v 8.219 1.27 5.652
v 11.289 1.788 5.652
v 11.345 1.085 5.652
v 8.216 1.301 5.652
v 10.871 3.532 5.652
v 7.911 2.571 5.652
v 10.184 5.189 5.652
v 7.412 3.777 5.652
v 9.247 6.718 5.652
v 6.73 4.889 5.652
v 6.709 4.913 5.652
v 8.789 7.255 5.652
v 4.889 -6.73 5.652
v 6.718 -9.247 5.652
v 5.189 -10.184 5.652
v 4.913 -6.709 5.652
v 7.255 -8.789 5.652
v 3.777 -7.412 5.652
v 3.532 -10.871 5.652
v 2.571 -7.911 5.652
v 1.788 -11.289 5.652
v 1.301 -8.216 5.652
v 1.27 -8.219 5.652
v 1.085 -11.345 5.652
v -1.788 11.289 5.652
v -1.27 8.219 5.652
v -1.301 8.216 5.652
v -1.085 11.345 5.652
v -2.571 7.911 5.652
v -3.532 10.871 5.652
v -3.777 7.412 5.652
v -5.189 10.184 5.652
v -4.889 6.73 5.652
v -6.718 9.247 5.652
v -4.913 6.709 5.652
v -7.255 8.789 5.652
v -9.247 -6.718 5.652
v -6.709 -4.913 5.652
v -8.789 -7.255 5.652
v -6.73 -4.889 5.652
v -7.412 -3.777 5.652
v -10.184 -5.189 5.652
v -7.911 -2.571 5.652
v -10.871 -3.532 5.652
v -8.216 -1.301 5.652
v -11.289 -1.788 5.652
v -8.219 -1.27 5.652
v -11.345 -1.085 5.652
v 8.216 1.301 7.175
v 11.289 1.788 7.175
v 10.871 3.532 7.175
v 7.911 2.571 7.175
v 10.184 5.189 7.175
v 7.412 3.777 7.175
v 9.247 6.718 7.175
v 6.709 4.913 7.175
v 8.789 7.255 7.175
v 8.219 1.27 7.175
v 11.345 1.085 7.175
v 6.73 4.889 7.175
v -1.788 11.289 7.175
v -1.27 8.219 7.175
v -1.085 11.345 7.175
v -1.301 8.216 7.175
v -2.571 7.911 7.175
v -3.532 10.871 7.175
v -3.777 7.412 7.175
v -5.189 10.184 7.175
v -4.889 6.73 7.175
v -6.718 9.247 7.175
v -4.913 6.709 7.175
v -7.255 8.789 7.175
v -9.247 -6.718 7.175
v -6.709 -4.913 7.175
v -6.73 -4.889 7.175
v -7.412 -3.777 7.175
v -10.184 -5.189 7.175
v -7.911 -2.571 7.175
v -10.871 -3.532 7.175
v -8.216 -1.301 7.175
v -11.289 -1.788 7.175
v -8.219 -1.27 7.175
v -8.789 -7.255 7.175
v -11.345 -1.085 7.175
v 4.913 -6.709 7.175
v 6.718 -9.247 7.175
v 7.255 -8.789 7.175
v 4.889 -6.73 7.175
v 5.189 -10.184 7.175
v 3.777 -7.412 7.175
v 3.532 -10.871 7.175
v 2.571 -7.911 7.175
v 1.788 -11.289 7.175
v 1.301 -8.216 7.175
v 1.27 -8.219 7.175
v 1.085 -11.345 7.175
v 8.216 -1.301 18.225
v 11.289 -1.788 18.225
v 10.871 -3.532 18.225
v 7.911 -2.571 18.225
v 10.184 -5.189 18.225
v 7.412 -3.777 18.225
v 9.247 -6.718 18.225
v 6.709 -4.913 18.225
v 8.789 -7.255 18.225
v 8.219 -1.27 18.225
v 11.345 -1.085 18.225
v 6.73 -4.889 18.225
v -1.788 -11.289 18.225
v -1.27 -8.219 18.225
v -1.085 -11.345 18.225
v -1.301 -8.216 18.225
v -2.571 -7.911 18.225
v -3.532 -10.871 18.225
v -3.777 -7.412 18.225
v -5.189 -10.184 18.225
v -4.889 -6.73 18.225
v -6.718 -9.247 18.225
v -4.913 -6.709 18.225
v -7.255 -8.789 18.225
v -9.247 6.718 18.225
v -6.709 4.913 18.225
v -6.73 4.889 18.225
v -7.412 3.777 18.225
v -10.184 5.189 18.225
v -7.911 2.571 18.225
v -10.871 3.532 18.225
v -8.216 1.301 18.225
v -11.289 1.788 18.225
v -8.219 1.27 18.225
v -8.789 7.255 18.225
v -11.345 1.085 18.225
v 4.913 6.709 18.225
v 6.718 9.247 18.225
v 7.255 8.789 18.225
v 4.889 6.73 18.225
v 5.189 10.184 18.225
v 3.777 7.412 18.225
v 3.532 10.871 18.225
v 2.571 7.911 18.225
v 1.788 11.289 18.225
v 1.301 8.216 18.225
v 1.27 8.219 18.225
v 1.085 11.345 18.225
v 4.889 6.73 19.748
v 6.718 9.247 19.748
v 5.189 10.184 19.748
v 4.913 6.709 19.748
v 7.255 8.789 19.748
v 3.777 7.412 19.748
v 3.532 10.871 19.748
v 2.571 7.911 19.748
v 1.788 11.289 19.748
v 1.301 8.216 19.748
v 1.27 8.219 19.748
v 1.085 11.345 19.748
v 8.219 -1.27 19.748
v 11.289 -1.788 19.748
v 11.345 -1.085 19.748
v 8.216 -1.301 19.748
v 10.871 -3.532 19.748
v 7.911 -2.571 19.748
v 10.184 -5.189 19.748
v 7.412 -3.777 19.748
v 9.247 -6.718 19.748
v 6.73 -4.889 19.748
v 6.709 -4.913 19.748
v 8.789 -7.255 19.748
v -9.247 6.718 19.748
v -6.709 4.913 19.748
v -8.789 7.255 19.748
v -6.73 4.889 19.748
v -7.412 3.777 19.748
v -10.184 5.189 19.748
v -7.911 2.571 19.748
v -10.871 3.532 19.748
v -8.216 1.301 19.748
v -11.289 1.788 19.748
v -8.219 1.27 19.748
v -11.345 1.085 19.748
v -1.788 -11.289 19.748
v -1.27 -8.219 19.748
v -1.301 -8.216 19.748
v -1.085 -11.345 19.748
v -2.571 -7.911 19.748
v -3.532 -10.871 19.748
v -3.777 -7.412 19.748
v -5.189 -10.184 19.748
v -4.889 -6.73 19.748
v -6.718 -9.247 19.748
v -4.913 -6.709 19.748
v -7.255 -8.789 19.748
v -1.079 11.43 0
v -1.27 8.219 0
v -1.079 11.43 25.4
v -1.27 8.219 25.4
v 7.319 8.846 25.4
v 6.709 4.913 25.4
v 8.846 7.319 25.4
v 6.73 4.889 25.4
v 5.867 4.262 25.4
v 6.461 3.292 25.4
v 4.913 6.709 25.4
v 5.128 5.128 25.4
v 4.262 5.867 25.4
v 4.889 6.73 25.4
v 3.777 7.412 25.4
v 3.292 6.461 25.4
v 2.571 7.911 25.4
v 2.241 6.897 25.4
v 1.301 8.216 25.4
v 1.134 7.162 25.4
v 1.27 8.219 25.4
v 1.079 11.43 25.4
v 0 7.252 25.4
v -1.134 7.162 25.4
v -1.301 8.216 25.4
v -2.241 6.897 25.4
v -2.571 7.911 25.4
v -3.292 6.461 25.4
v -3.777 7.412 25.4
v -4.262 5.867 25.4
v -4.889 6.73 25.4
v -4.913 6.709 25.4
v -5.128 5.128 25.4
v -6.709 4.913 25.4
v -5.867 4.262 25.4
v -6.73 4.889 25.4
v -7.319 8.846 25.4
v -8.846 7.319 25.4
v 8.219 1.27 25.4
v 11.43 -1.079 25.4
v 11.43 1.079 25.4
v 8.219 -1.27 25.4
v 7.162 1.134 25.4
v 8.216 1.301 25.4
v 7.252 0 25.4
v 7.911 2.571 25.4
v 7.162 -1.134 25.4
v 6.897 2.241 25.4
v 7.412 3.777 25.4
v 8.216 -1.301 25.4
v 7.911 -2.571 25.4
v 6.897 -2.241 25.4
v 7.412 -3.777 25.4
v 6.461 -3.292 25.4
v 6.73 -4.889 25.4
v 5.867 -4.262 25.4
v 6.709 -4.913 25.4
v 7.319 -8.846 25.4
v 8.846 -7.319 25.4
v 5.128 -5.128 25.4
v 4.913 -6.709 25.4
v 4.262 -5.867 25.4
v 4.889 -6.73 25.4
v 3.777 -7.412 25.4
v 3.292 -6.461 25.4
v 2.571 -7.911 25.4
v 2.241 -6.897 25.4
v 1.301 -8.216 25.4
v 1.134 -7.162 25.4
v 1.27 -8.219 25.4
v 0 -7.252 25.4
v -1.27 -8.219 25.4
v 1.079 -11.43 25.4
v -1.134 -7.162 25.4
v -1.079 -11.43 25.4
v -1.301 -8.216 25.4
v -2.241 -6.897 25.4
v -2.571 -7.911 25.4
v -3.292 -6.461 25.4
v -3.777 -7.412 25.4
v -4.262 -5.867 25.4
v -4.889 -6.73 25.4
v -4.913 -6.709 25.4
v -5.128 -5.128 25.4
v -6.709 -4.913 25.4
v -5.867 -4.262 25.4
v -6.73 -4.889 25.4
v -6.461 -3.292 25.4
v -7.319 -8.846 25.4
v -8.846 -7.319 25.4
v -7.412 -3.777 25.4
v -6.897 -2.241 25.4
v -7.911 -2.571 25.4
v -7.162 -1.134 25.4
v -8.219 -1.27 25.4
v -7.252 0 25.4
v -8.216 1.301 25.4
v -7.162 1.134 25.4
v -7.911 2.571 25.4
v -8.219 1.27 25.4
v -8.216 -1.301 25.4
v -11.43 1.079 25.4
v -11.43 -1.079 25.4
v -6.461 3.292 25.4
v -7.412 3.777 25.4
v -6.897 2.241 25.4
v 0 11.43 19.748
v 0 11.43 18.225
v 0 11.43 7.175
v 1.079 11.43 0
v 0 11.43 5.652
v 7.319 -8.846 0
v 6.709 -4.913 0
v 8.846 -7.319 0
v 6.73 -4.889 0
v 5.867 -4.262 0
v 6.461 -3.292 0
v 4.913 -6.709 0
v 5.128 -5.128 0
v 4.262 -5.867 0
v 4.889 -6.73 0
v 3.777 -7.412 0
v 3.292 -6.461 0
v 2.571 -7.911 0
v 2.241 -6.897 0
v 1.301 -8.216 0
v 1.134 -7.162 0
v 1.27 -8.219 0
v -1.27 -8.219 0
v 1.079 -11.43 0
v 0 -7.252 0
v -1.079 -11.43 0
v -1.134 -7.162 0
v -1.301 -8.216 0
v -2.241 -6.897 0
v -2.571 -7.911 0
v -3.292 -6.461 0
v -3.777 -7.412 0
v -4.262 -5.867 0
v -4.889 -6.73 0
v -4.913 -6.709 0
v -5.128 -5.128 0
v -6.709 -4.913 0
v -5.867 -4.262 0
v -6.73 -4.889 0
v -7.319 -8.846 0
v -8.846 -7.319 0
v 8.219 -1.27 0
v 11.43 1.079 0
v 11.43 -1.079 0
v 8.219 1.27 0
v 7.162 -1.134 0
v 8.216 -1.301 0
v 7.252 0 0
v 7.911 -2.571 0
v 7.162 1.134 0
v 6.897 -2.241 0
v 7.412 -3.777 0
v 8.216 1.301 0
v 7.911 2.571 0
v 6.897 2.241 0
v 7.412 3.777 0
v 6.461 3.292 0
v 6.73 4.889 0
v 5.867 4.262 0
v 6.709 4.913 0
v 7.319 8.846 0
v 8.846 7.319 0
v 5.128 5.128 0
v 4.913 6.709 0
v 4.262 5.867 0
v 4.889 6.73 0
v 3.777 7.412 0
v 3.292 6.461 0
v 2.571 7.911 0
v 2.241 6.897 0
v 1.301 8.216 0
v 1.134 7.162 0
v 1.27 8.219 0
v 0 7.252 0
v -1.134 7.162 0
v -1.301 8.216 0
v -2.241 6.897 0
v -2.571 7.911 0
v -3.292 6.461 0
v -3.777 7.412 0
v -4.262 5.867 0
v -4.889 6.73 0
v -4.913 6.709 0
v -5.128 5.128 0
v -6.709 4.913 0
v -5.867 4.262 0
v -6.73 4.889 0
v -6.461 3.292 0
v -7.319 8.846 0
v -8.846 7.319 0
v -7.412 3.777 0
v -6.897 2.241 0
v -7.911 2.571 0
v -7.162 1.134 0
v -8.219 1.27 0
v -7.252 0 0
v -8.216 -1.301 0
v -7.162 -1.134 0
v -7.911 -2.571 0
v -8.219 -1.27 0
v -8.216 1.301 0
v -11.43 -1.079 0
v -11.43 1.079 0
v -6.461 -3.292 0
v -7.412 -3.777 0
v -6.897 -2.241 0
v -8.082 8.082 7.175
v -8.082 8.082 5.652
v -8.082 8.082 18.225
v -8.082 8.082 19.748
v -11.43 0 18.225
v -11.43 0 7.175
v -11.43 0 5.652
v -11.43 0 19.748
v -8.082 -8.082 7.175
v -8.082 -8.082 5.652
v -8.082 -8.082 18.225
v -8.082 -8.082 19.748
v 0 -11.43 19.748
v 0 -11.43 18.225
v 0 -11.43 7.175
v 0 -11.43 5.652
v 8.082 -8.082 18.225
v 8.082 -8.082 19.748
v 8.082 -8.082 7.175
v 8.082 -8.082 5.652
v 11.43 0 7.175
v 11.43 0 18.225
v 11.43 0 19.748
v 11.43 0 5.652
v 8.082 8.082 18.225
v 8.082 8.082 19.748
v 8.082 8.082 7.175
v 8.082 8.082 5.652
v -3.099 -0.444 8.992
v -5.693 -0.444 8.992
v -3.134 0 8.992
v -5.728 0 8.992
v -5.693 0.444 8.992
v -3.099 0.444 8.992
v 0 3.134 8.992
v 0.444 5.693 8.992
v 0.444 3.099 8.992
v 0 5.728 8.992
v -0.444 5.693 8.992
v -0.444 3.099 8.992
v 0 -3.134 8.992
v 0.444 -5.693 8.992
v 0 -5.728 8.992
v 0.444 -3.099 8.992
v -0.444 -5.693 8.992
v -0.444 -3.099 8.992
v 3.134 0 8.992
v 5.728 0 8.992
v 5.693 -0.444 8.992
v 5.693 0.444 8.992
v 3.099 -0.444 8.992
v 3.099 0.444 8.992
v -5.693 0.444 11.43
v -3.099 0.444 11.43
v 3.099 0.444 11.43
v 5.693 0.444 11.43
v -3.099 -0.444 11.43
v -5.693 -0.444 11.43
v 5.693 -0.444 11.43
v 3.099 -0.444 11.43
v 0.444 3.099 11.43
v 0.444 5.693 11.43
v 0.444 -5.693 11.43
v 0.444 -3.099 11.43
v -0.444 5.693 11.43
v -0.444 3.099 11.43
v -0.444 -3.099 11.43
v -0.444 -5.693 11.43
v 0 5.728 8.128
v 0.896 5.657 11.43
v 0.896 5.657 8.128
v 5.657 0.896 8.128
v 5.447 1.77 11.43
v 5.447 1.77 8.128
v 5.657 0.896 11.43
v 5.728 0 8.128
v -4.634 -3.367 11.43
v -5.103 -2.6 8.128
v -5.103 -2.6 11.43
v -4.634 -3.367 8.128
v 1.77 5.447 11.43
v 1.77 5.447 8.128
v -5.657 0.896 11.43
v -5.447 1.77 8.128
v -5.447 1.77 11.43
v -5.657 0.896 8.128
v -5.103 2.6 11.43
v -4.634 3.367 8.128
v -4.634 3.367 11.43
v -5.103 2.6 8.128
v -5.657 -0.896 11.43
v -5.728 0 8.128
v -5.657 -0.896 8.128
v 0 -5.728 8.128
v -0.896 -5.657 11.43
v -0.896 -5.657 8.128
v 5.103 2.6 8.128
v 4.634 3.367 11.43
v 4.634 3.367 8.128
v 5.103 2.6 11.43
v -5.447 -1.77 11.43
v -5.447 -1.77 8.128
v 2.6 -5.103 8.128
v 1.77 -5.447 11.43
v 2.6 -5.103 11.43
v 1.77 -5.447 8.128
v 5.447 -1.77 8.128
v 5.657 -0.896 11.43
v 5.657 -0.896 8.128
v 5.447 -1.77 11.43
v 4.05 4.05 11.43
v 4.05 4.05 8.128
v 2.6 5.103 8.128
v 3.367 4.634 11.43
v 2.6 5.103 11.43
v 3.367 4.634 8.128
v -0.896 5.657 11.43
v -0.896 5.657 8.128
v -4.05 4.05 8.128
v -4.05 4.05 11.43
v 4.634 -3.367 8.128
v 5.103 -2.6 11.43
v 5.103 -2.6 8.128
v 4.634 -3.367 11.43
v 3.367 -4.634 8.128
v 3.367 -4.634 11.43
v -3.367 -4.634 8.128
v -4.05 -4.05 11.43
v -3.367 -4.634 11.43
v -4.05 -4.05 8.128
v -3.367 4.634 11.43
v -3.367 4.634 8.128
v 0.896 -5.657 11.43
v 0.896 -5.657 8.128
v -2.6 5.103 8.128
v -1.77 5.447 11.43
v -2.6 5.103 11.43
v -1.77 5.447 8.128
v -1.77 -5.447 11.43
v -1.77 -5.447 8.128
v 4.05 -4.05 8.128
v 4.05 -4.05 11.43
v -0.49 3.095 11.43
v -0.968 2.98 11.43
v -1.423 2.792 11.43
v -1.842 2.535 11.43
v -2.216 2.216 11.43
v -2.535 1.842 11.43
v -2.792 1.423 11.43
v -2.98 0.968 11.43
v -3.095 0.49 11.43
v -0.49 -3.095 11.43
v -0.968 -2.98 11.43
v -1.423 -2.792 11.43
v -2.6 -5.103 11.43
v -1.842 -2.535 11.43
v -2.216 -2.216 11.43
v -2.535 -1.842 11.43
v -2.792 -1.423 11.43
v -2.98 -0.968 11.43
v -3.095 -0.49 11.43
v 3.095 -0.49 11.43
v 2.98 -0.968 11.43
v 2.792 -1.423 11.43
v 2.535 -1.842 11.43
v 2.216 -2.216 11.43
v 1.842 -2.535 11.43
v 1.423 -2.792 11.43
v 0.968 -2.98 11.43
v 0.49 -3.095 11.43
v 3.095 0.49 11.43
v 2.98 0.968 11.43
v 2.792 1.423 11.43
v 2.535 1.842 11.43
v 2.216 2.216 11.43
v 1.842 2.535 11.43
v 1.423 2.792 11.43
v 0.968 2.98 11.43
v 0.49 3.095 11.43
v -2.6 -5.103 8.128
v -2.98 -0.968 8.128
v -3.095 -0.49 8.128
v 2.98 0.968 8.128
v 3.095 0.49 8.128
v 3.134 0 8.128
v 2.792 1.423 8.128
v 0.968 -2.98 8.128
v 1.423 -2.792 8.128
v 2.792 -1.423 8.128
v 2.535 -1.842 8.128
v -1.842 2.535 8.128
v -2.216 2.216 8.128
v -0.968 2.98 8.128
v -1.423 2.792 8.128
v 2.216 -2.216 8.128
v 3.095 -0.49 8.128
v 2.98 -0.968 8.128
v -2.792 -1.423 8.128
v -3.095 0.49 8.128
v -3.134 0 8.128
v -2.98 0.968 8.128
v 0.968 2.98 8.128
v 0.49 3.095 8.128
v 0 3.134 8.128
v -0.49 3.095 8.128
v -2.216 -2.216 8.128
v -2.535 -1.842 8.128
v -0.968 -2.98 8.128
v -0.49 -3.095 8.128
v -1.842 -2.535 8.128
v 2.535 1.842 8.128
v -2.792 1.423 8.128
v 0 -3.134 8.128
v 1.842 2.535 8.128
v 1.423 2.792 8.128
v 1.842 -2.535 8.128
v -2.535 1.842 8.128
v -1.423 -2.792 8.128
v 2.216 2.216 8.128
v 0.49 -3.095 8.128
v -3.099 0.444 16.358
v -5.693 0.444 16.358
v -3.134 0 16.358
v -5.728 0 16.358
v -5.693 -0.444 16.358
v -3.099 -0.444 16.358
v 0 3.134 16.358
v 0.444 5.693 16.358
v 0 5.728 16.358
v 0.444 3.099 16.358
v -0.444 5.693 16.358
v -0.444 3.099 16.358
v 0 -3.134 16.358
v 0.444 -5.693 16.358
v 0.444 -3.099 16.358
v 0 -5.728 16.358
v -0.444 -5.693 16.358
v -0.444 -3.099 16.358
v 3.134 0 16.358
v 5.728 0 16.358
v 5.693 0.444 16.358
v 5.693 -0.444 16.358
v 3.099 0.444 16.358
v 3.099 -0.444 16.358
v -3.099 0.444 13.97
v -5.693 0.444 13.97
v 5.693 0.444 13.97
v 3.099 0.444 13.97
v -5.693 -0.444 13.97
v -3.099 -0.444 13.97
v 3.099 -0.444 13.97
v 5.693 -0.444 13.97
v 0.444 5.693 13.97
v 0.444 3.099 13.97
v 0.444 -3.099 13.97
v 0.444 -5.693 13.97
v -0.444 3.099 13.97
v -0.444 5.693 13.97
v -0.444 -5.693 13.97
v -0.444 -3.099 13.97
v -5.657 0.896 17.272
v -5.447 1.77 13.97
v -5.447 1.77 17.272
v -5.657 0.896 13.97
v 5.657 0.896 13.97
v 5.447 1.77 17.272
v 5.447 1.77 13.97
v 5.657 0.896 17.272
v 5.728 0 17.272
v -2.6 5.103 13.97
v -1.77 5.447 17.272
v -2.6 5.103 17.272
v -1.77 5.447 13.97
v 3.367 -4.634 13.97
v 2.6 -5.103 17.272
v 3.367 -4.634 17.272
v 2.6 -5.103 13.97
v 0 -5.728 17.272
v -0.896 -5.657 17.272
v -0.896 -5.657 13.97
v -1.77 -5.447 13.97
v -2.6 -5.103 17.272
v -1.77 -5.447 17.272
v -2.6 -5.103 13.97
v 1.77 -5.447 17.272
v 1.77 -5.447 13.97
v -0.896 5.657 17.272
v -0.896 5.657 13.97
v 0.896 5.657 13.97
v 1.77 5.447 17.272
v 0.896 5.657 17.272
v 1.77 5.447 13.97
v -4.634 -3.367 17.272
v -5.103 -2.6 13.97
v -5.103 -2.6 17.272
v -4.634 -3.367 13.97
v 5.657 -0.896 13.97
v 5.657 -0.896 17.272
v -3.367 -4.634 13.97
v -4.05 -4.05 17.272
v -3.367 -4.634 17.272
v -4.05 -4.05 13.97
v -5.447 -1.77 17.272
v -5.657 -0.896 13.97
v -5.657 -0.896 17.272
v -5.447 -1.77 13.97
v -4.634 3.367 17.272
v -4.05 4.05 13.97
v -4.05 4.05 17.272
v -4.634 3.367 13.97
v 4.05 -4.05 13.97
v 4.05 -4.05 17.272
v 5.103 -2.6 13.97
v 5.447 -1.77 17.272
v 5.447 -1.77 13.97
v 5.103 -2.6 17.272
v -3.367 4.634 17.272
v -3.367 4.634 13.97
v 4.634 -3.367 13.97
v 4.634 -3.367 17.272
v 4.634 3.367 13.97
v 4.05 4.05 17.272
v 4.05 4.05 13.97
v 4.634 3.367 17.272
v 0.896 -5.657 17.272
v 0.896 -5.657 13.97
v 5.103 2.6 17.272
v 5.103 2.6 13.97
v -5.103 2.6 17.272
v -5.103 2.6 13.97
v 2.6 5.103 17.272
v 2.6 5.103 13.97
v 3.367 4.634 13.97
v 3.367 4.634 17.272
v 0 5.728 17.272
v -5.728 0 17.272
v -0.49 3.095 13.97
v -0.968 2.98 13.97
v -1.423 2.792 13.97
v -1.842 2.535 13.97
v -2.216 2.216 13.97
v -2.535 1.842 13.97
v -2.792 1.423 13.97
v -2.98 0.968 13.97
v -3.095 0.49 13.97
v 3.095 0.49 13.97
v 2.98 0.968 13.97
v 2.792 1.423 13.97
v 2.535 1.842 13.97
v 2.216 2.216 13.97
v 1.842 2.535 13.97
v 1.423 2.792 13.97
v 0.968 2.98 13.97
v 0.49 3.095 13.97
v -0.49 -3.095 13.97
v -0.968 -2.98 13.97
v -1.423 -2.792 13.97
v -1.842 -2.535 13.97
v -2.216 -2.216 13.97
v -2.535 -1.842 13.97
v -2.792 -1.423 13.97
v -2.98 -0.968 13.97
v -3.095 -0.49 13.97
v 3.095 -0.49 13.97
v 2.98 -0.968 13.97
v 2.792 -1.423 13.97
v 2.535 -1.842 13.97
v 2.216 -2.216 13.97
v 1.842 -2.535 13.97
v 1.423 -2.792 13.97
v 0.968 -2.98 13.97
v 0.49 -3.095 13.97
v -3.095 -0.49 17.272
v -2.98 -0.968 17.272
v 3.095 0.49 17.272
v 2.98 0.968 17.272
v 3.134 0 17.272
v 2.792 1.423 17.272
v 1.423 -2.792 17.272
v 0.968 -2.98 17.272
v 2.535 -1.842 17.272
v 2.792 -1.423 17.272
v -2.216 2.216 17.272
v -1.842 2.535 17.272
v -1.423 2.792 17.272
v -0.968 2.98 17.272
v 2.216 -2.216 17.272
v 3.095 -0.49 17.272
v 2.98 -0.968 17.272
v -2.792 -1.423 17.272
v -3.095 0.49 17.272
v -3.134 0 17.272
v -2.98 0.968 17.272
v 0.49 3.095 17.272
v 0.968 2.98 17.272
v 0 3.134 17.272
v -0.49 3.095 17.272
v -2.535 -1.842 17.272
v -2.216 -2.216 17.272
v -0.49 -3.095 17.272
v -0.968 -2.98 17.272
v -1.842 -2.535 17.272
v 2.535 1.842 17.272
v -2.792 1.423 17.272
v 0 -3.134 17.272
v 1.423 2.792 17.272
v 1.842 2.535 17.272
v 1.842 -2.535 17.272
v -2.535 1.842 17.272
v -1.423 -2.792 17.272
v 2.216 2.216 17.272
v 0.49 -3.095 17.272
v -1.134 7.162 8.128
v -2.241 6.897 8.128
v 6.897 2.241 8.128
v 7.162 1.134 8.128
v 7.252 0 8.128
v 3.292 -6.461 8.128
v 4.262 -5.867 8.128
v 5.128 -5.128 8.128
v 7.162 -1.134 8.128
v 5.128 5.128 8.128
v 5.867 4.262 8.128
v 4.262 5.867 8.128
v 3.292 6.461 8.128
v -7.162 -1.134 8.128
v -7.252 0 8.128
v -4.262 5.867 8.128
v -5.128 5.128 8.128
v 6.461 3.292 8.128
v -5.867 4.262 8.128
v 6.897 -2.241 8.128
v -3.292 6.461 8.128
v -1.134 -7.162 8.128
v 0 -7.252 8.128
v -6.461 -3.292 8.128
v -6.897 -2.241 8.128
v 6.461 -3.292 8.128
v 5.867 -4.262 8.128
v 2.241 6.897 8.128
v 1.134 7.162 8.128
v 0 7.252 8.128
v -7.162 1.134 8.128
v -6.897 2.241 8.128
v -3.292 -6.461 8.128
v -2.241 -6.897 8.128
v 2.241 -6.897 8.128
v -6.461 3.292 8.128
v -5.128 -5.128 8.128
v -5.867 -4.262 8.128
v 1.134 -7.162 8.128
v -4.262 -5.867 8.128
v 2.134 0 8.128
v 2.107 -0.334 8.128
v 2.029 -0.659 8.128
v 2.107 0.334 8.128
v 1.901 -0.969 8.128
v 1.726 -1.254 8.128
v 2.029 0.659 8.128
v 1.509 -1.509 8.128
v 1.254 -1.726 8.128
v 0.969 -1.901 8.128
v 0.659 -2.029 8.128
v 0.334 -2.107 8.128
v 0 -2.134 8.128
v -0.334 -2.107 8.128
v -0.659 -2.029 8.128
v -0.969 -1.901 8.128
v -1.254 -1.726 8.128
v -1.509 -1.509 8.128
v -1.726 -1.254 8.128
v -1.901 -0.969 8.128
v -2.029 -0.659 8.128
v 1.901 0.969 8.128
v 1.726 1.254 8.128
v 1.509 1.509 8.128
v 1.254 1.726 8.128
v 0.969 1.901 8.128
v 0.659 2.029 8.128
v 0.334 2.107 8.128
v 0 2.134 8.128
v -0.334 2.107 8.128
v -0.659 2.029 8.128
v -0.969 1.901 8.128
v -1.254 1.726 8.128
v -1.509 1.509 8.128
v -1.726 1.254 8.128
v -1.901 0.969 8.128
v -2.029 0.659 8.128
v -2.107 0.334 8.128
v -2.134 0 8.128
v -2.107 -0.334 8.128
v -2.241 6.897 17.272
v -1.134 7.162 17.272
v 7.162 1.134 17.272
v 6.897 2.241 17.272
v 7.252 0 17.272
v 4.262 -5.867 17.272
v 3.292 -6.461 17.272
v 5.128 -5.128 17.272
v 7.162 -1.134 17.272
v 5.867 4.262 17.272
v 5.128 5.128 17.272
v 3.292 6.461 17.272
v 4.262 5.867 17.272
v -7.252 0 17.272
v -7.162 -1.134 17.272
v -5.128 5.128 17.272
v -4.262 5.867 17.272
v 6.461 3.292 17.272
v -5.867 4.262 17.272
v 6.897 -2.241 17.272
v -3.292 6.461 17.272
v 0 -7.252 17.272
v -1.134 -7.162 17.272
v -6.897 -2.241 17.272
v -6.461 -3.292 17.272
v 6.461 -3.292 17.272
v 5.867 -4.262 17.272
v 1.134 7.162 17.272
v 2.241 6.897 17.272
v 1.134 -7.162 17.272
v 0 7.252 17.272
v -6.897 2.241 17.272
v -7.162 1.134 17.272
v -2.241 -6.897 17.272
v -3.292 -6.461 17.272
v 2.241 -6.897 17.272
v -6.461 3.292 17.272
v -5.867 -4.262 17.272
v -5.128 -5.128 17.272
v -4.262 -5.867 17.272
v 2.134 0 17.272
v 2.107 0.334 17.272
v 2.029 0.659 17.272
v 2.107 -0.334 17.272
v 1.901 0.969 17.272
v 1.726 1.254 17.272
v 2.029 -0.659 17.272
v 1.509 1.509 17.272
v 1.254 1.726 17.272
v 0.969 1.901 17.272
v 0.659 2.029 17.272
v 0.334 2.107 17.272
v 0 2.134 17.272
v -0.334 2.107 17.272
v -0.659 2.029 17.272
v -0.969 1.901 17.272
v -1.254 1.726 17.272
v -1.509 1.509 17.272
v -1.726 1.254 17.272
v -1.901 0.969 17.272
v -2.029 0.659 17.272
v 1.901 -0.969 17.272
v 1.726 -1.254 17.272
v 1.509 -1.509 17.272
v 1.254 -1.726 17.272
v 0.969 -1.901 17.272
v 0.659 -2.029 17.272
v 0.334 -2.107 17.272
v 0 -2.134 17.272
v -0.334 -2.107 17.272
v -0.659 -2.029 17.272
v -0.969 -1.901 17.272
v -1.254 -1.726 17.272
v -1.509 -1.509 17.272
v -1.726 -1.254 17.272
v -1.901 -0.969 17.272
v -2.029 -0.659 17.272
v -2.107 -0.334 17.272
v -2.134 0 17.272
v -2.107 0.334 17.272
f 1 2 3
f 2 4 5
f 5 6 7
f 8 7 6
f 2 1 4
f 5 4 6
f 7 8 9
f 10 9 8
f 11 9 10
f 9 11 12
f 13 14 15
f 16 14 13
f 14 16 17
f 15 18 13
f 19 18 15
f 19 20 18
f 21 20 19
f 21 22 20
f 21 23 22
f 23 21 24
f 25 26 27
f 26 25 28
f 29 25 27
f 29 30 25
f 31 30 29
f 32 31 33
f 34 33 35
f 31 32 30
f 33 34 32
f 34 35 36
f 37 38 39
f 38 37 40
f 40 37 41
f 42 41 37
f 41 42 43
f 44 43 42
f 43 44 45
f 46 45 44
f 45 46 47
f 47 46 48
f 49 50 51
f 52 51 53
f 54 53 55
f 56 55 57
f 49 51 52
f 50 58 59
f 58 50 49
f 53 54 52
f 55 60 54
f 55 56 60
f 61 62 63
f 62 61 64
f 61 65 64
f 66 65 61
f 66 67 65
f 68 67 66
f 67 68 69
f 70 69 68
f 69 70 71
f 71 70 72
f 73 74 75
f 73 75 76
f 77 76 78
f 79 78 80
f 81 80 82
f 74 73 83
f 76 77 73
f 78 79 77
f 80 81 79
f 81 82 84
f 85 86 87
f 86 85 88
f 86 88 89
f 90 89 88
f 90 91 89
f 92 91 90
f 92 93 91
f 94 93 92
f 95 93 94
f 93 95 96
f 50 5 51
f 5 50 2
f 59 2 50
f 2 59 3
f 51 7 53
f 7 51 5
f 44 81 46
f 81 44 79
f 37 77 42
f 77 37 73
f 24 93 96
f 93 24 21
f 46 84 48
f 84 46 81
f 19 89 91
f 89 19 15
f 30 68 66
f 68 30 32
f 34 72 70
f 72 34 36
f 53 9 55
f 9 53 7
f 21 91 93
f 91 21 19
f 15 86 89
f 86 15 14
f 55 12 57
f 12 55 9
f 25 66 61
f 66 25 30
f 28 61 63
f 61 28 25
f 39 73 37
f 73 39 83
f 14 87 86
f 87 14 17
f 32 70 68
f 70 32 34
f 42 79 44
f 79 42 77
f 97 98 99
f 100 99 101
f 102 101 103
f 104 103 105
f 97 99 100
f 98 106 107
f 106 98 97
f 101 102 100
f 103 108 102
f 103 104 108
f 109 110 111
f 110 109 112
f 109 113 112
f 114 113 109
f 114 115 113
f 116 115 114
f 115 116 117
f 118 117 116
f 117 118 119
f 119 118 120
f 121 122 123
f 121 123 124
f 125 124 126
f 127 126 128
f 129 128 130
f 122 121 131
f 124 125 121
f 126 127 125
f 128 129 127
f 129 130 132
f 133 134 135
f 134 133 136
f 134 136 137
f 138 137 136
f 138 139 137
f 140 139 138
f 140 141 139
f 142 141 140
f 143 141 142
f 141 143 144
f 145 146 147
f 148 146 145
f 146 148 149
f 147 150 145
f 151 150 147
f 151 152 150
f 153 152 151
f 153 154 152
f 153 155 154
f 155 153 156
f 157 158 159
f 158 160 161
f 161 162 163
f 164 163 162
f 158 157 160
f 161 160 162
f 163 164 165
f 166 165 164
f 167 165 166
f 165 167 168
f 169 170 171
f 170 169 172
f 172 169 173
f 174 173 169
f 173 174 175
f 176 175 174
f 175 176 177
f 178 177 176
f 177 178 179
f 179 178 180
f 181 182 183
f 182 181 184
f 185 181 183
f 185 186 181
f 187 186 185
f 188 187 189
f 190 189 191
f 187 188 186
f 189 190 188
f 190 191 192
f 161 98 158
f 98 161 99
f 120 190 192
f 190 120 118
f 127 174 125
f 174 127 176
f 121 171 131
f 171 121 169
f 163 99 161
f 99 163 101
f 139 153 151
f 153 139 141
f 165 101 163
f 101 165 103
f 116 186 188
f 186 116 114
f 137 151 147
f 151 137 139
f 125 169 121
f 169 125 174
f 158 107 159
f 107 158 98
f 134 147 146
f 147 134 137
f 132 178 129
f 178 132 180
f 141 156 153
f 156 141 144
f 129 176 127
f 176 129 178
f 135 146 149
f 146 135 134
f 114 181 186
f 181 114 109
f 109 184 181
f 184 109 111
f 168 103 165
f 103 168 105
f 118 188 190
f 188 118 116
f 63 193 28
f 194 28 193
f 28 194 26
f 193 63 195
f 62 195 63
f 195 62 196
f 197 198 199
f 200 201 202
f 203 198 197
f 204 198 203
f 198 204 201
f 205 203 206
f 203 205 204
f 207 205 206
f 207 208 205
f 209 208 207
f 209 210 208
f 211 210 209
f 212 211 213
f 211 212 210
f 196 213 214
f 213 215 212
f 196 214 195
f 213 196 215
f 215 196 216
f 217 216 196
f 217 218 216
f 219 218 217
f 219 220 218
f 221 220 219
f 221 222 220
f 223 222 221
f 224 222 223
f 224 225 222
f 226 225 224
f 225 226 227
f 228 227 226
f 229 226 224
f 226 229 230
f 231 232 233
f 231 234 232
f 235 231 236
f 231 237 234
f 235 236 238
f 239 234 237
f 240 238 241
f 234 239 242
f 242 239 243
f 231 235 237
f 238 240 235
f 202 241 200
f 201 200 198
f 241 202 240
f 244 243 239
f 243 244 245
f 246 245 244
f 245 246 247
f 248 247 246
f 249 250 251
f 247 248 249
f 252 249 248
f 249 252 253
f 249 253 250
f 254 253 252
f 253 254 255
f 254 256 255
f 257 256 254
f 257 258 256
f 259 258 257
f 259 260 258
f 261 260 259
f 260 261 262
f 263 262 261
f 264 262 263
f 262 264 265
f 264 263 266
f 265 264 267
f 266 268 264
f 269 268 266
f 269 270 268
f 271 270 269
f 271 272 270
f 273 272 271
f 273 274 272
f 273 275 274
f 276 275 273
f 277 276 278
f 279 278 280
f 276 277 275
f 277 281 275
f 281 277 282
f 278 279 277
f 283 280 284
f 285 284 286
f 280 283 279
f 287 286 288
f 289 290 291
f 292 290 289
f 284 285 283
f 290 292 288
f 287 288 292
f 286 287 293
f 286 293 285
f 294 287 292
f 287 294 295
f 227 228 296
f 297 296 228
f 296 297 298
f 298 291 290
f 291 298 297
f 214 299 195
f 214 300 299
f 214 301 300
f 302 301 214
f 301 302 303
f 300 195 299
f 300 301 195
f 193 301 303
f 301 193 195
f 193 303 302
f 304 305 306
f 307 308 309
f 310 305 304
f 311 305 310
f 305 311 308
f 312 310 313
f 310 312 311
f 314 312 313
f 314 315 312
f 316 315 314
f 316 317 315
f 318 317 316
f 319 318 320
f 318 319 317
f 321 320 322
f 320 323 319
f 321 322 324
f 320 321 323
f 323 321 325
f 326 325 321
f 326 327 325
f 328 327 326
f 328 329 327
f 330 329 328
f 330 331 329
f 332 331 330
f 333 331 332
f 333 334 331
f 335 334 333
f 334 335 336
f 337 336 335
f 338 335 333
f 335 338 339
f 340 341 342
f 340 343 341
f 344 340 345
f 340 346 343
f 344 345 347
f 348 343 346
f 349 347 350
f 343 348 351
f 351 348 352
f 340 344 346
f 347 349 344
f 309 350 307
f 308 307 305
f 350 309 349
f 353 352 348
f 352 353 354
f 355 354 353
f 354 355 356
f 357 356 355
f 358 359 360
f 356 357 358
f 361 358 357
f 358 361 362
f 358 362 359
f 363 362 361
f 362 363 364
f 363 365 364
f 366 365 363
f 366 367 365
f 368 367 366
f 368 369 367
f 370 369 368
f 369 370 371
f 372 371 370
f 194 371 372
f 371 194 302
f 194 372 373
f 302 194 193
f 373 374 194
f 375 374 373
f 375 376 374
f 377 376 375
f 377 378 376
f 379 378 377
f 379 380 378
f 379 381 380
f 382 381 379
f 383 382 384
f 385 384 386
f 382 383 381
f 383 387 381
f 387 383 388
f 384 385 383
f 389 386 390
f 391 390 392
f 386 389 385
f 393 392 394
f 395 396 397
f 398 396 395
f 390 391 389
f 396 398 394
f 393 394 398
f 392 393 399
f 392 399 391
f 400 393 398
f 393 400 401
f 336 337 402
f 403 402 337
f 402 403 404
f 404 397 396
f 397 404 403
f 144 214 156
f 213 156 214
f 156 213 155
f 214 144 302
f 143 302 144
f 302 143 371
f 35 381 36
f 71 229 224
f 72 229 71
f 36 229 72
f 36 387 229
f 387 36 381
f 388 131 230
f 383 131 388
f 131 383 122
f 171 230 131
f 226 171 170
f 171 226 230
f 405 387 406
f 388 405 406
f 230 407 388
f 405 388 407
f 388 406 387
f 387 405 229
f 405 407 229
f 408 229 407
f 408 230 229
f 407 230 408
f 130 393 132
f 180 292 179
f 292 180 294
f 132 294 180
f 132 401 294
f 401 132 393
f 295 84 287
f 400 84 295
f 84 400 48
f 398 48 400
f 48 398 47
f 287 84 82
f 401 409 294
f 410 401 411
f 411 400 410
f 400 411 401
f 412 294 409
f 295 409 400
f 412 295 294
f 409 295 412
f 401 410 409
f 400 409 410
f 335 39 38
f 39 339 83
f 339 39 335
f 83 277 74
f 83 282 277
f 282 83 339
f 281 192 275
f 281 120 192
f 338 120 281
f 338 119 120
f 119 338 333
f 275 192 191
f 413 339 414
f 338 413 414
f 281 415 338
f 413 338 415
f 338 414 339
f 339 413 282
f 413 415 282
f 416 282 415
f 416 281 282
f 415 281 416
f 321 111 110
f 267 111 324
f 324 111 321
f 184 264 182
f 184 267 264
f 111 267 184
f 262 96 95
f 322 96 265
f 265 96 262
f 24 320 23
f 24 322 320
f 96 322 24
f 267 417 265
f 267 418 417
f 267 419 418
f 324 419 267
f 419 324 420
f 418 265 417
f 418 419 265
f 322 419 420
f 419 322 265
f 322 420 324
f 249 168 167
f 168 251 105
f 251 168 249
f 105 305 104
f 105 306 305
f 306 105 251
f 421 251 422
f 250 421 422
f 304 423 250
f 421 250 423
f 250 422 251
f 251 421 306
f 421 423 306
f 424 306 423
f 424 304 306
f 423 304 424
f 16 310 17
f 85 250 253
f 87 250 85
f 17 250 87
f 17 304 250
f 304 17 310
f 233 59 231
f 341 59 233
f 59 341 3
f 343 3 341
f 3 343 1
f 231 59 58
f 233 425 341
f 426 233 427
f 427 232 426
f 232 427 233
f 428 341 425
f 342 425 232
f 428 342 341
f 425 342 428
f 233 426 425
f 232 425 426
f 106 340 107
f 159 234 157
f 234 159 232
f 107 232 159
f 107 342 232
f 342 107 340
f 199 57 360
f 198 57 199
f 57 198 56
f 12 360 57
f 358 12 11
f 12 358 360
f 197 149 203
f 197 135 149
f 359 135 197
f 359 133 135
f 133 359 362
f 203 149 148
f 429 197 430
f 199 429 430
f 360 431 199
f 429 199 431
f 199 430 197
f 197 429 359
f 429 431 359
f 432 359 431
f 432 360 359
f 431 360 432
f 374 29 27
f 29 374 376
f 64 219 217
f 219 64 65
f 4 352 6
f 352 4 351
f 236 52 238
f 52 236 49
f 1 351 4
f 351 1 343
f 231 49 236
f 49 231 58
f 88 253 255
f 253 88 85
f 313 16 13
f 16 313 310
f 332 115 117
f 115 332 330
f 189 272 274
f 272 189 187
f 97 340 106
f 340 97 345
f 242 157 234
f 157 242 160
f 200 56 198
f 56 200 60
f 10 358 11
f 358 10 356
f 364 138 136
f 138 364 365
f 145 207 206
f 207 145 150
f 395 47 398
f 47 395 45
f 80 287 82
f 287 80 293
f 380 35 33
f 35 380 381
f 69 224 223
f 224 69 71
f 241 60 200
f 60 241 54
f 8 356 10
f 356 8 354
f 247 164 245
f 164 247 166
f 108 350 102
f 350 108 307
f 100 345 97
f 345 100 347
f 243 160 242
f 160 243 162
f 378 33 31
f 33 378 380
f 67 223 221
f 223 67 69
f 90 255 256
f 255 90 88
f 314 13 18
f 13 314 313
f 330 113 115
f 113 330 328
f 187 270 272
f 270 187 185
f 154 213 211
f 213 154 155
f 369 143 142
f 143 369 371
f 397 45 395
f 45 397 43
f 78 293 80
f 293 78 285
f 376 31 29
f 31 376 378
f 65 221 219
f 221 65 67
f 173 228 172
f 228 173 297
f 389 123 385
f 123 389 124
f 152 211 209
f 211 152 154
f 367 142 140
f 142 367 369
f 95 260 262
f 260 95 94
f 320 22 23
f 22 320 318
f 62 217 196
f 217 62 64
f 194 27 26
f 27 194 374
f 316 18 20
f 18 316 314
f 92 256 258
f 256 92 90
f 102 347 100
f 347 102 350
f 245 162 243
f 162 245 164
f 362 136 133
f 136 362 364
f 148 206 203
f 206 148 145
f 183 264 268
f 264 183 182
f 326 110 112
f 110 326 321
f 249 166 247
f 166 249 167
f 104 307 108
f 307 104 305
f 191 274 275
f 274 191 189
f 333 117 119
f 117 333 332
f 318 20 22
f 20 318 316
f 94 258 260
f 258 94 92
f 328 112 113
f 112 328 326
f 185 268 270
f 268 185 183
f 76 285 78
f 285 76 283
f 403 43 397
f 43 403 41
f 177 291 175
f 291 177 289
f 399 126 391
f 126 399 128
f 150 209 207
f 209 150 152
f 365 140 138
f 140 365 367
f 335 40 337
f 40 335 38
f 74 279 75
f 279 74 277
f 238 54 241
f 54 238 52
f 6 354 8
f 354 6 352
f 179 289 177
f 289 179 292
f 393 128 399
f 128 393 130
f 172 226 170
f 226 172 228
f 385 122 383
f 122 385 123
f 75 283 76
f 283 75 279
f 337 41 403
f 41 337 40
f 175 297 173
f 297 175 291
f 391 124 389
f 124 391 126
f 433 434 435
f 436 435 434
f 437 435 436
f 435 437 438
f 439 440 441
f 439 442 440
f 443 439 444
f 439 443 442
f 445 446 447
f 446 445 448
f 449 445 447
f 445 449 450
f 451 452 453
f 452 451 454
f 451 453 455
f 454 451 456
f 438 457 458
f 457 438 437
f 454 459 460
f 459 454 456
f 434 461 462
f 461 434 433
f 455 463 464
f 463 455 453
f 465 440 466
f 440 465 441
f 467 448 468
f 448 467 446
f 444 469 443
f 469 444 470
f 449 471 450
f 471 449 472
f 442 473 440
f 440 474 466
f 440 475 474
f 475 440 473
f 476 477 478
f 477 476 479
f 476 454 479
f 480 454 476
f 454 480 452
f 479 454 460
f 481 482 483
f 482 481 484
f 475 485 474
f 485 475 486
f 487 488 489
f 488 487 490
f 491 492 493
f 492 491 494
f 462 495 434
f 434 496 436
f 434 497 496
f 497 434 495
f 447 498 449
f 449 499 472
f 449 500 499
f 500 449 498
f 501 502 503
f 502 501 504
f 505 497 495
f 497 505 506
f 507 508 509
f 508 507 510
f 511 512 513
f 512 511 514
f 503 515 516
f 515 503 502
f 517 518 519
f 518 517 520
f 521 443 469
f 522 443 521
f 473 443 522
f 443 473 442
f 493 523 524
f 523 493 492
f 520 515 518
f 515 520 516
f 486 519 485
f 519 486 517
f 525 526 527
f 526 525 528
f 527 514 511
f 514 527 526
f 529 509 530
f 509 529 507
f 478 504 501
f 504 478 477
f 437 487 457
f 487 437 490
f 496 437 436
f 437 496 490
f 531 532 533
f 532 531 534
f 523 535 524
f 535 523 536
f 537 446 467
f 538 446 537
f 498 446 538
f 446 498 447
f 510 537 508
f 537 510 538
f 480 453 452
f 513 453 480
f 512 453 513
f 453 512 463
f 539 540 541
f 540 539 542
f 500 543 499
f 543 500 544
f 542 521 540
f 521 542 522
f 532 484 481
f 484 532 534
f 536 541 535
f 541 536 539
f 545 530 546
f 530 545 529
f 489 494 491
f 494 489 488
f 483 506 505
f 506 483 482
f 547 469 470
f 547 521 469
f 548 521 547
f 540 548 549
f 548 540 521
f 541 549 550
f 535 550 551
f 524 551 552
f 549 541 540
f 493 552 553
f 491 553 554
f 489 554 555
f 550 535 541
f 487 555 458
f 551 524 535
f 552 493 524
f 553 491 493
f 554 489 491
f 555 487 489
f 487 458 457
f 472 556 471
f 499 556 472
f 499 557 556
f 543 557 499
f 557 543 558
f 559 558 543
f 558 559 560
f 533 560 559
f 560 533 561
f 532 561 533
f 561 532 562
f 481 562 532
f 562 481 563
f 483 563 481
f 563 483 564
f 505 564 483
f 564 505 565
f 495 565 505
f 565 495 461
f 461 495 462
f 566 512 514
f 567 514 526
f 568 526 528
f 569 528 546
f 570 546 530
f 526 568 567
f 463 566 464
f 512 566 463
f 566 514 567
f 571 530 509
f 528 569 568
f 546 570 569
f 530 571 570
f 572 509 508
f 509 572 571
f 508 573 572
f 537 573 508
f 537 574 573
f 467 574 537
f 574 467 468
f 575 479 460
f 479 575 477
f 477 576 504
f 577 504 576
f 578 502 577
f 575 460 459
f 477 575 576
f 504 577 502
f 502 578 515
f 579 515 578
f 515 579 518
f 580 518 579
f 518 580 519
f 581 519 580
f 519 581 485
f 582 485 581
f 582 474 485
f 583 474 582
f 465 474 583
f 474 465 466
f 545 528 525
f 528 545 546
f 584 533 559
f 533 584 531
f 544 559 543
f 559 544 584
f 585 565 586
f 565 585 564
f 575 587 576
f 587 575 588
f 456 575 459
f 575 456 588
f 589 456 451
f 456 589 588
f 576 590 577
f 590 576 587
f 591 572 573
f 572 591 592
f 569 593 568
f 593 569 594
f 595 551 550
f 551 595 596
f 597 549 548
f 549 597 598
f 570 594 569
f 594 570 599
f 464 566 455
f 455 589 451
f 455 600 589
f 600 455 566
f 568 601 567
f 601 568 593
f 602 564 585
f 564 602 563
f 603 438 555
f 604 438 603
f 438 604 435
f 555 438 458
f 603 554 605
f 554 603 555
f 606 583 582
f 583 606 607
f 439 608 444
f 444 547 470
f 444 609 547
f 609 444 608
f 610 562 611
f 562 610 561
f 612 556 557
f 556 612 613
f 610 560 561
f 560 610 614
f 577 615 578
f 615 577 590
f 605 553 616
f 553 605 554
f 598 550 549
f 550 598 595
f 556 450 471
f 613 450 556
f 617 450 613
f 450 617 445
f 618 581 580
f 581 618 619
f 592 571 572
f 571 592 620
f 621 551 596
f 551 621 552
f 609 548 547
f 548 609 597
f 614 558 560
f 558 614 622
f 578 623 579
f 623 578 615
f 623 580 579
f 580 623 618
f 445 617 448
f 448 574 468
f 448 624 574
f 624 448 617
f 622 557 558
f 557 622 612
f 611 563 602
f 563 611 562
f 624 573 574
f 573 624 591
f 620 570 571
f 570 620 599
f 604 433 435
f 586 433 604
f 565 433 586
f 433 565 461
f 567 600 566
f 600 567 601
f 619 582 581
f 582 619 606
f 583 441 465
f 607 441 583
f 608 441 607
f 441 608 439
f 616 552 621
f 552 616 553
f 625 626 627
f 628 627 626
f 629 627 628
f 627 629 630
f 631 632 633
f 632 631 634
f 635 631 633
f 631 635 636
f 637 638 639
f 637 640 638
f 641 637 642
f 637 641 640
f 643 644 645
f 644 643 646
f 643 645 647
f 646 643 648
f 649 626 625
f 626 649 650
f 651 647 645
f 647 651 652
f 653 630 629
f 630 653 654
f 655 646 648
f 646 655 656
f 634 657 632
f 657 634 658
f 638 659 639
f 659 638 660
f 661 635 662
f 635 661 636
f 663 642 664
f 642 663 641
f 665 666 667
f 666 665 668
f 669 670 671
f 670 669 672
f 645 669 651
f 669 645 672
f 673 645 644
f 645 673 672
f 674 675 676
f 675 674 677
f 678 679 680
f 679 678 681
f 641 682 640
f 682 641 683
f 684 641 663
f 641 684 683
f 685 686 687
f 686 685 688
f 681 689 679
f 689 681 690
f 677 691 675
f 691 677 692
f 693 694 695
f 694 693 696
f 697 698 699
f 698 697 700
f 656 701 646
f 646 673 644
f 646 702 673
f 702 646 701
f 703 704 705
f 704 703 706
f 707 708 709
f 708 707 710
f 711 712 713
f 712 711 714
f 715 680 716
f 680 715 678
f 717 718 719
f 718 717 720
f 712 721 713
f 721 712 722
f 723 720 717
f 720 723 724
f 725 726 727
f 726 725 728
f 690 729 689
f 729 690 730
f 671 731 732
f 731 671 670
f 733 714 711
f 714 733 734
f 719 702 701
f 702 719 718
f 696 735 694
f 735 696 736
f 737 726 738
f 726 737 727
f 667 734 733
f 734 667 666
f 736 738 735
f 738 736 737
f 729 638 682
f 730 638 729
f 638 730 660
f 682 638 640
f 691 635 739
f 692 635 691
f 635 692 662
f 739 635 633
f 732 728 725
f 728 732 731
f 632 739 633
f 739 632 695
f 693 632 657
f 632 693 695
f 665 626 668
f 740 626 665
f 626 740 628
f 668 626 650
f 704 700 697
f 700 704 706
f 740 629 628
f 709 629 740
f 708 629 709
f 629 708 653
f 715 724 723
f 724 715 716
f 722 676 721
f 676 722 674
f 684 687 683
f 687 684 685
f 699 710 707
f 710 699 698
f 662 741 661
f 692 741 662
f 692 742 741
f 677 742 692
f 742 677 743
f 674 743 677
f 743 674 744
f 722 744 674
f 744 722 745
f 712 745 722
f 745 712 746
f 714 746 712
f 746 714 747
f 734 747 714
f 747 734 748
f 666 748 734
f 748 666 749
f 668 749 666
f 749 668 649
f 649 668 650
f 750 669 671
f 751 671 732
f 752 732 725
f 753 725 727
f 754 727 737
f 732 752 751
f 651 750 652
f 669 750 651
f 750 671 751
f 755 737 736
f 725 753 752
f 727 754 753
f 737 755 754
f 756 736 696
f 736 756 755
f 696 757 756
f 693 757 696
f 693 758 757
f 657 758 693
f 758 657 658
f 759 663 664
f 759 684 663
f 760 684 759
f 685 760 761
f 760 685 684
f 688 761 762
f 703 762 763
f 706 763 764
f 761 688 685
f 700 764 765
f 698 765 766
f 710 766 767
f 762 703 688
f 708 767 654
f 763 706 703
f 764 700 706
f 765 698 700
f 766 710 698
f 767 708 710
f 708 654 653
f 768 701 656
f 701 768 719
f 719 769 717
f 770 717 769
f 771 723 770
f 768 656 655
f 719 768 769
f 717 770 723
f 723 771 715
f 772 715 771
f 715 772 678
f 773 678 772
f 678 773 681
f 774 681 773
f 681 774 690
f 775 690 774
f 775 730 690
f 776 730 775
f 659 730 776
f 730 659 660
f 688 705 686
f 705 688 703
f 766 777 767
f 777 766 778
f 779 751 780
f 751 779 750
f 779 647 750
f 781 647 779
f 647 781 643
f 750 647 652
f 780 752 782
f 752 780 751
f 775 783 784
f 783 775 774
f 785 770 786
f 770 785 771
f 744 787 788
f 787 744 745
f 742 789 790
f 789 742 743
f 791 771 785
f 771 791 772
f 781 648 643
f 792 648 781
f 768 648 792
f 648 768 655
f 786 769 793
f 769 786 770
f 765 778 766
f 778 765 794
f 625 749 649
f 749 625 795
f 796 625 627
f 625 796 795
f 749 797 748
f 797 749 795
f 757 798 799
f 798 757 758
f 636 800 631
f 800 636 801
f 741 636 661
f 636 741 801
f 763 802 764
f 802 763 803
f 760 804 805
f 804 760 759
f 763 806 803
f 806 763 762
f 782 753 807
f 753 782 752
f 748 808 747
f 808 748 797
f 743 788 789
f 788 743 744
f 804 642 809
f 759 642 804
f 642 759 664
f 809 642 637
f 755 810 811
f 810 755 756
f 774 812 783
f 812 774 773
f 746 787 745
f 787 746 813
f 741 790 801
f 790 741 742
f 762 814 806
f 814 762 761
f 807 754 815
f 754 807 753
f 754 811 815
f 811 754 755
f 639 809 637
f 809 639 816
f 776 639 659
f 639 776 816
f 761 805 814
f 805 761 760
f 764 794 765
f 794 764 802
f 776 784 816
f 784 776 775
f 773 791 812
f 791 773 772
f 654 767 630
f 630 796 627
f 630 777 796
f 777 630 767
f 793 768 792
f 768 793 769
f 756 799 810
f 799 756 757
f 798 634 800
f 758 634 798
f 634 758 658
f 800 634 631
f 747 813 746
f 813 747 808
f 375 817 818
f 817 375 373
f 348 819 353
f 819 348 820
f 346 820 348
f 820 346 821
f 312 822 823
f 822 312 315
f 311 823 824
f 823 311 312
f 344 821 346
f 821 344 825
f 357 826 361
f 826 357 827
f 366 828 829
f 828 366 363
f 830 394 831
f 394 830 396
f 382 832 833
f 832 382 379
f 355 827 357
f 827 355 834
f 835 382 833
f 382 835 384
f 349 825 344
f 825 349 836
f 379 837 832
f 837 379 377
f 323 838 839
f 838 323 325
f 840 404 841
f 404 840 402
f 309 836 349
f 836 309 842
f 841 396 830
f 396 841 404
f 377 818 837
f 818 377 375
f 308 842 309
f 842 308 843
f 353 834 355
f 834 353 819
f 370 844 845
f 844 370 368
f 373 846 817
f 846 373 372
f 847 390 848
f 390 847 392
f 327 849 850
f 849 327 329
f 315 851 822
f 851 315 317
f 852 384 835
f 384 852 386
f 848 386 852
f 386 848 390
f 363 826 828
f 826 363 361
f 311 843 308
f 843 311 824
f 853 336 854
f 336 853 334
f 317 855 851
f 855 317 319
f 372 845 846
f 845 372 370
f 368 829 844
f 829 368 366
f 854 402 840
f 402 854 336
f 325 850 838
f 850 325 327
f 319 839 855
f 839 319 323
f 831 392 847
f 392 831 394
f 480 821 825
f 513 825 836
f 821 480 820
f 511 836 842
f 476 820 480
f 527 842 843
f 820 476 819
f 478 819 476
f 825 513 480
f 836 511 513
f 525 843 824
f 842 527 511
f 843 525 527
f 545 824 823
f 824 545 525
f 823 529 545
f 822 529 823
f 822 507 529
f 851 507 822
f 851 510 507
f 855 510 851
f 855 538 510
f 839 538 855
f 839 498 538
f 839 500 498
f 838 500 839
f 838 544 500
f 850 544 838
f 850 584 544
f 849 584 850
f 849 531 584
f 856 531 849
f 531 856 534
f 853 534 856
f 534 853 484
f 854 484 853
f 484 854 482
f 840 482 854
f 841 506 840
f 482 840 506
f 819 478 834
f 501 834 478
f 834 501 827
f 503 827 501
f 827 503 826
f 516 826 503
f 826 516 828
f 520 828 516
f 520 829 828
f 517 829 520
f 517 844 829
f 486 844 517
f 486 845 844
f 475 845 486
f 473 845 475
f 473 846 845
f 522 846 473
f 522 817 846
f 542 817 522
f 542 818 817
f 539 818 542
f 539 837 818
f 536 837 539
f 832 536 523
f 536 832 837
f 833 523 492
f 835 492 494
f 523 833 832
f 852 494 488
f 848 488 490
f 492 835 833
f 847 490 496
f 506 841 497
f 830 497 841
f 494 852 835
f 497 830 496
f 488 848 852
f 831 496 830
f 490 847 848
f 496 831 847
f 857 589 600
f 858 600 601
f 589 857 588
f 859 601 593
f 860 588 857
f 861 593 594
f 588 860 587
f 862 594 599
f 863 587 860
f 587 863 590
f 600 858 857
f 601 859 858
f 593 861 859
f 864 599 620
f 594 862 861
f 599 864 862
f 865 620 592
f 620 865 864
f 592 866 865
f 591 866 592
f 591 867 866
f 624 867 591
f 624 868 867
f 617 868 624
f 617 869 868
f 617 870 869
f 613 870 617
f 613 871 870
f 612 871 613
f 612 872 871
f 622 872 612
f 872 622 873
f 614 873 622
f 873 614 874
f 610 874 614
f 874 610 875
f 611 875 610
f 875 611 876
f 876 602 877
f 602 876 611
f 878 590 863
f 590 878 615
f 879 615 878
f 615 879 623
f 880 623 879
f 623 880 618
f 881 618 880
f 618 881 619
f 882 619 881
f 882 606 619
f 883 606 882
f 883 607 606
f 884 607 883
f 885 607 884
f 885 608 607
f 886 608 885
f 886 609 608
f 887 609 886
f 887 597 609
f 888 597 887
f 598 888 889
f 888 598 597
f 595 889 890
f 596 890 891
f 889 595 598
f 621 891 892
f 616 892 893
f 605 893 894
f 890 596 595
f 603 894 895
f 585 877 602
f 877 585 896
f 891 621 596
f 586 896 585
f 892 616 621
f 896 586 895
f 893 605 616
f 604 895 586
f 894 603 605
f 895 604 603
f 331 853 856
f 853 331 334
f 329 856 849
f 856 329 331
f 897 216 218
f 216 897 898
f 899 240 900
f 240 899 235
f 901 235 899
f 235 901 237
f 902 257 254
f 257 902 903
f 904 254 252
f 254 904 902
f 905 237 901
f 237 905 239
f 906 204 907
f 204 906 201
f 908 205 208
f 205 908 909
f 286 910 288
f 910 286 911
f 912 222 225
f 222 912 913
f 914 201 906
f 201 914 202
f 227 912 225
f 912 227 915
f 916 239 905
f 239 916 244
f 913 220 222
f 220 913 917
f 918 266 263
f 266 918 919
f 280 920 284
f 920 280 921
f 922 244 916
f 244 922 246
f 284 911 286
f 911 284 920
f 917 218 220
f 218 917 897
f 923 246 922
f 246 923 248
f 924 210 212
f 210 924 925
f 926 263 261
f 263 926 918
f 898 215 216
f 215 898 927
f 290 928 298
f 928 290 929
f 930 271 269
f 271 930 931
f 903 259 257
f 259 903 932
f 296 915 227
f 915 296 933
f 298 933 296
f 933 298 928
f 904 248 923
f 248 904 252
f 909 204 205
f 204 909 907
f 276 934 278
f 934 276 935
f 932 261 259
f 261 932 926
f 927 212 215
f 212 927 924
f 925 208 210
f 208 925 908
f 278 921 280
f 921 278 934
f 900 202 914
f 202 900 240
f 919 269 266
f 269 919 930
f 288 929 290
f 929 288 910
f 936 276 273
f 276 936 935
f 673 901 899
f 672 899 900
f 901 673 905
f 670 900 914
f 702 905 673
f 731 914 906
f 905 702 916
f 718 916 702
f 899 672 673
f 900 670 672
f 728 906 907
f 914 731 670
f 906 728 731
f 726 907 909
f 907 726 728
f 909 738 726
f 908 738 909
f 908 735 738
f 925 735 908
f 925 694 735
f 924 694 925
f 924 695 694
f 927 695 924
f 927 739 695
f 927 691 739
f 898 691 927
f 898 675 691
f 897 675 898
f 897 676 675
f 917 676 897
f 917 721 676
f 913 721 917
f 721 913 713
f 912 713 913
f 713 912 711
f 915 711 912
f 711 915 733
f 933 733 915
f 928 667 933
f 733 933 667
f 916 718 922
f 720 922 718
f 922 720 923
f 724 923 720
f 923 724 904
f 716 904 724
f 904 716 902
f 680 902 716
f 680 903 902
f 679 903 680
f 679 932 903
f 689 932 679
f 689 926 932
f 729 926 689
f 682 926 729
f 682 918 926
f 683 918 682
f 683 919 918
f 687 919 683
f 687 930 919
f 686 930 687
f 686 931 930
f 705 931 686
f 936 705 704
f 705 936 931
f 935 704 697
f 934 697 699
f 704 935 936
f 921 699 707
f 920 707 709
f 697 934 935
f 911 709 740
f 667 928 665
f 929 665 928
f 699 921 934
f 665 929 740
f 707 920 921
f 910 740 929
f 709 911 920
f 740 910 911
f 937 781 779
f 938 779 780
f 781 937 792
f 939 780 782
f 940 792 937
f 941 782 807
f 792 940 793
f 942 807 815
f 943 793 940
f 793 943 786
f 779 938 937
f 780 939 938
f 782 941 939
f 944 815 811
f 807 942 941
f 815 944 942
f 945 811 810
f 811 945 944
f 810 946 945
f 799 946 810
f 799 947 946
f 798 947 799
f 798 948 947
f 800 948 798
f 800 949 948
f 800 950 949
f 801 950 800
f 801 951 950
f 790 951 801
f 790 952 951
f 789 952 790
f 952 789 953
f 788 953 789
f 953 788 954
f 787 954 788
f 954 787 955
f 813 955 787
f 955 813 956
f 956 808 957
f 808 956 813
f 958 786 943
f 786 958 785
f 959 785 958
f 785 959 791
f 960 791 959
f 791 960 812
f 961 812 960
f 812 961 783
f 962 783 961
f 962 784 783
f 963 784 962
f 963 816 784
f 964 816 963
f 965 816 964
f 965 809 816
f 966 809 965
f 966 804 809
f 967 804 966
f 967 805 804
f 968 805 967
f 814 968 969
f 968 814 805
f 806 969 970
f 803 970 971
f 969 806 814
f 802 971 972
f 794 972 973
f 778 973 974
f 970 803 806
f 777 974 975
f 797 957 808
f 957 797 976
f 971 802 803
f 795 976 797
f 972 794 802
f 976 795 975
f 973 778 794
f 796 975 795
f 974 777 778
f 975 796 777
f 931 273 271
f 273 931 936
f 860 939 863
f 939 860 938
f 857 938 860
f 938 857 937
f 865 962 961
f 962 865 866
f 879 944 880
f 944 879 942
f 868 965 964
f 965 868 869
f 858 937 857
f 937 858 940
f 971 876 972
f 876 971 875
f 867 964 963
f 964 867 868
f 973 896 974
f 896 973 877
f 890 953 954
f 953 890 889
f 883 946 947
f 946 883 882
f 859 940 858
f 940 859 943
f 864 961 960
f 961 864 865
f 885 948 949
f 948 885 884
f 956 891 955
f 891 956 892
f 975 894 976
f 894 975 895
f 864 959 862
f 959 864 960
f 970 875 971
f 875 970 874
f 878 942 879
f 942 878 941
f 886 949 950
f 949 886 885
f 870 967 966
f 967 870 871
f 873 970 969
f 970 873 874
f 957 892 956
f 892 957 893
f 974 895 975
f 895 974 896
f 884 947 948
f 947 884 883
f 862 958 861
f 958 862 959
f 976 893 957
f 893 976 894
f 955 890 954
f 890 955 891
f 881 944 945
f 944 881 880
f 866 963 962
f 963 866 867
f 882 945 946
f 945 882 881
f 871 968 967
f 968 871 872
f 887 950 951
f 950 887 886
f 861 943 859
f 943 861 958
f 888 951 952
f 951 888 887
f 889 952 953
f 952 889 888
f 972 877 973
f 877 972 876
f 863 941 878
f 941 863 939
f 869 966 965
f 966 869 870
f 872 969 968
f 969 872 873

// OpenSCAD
//
// B006 sprocket: this part was only ever included in three modern
// sets: the Drilling Vehicle (4600), the Rattle Trap (5650) and
// the Time Machine (7651). And only the Drilling Vehicle had them
// in sufficient quantity to be useful. All of these sets are now
// as rare as hen's teeth. Which is a shame, as the tracks it was
// designed for where recycled in the 2005 15 model set, and the
// tracks really don't work well without these sprockets.
//
// This model has been optimized for brass 19T pinions rather than
// the plastic variety (mostly because I had the former and not the
// latter). The DXF settings for the gear outline are:
//
// Circular pitch: 2.09990666845
// Pressure angle: 20
// Clearance: 0.15
// Backlash: 0.15
// Profile shift: 0
// Wheel 1 tooth count: -19
// Wheel 1 Center Hole diameter: 0
// Wheel 2 tooth count: 4
// Wheel 2 Center Hole diameter: 0
// Show: Wheel 1 only
// Rotation steps per tooth angle: 10
// Number of segments: 30
//
// V1.0 April 13, 2018 WH - best guess dimensions
// V1.1 April 18, 2018 WH - minor comment change
// V1.2 April 24, 2018 WH - dimensions from actual part - Thanks to Newspaniard
//
$fn=40;
eps=0.05;
//
// parameters
//
intermittent_rings=true;	// true for tread ring on only one side at
                          // a time, alternating; false for continuous
                          // tread rings on both sides
//
// Meccano constants
//
inch=25.4;
axle_id=0.168*inch;

module B006_sprocket(intermittent_rings=true) {

  tube_od=0.655*inch;
  tube_id=0.571*inch;
  tube_h=1*inch;

  recess_h=0.320*inch; // 8.35;

  tread_w=0.435*inch;  // treads are actually 3/8" (0.375")

  ring_d=0.900*inch; // 0.860*inch;
  ring_h=0.060*inch; // 0.085*inch;
  ring_w=(ring_d-tube_od)/2;

  ring1_height=(tube_h-tread_w-2*ring_h)/2;
  ring2_height=ring1_height+ring_h+tread_w;

  spoke_w1=0.085*inch; // 0.055*inch;
  spoke_w2=0.100*inch; // 0.055*inch;
  spoke_angle=45;

  gear_h=1/8*inch;

  axle_od=axle_id+2;

  cross_h=0.130*inch; // 2;
  cross_w=0.035*inch; // 1.5;
  cross_d=tube_id-0.12*inch; // 3;
  cross_h_offset=0.036*inch;

  union() {
    difference() {
      // main cylinder, tread rings and spokes
      union() {
        // main cylinder
        cylinder(d=tube_od,h=tube_h);
        // lower tread ring
        translate([0,0,ring1_height]) 
          intersection() {
            cylinder(d=ring_d,h=ring_h);
            // continuous or intermittent?
            if( intermittent_rings ) {
              union() {
                for( angle=[0:spoke_angle*2:360-2*spoke_angle]) {
                  rotate([0,0,angle])
                    linear_extrude(height=ring_h)
                     polygon([[0,0],[ring_d,0],[ring_d,ring_d],[0,0]]);
                }
              }
            }
          }
        // upper tread ring
        translate([0,0,ring2_height]) 
          intersection() {
            cylinder(d=ring_d,h=ring_h);
            // continuous or intermittent?
            if( intermittent_rings ) {
              union() {
                // top ring is offset so that intermittent rings are
                // either one side or the other
                for( angle=[45:spoke_angle*2:360-spoke_angle]) {
                  rotate([0,0,angle])
                    linear_extrude(height=ring_h)
                      polygon([[0,0],[ring_d,0],[ring_d,ring_d],[0,0]]);
                }
              }
            }
          }
        // tread spokes
        for( angle=[0:spoke_angle:360-spoke_angle]) {
          linear_extrude(height=tube_h)
            rotate([0,0,angle])
              translate([0,tube_od/2,0])
                polygon([
                  [-spoke_w2/2,-0.1],
                  [spoke_w2/2,-0.1],
                  [spoke_w1/2,(ring_d-tube_od)/2],
                  [-spoke_w1/2,(ring_d-tube_od)/2],
                  [-spoke_w2/2,-0.1]
                ]);           
        }
      }
      // remove bottom recess
      translate([0,0,-eps])
        cylinder(d=tube_id,h=recess_h+eps);
      // remove bottom cross material
      translate([0,0,recess_h-eps])
        difference() {
          cylinder(d=cross_d,h=cross_h+eps);
          cylinder(d=axle_od,h=cross_h+eps);
          translate([0,0,cross_h/2+cross_h_offset])
            union() {
              cube([cross_d,cross_w,cross_h],center=true);
              cube([cross_w,cross_d,cross_h],center=true);
            }
        }
      // remove top recess
      translate([0,0,tube_h-recess_h])
        cylinder(d=tube_id,h=recess_h+eps);
      // remove top cross material
      translate([0,0,tube_h-recess_h-cross_h])
        difference() {
          cylinder(d=cross_d,h=cross_h+eps);
          cylinder(d=axle_od,h=cross_h+eps);
          translate([0,0,cross_h/2-cross_h_offset])
            union() {
              cube([cross_d,cross_w,cross_h],center=true);
              cube([cross_w,cross_d,cross_h],center=true);
            }
        }
      // remove axle
      cylinder(d=axle_id,h=tube_h);
    }
    // add in 19 tooth gear rings
    translate([0,0,tube_h-recess_h-eps])
      linear_extrude(height=gear_h+eps)
        intersection() {
          import("B006_19teeth_interior.dxf",convexity=10);
          circle(r=tube_od/2);
        }
    translate([0,0,recess_h-gear_h])
      linear_extrude(height=gear_h+eps)
        intersection() {
          import("B006_19teeth_interior.dxf",convexity=10);
          circle(r=tube_od/2);
        }
  }
}

B006_sprocket(intermittent_rings);
